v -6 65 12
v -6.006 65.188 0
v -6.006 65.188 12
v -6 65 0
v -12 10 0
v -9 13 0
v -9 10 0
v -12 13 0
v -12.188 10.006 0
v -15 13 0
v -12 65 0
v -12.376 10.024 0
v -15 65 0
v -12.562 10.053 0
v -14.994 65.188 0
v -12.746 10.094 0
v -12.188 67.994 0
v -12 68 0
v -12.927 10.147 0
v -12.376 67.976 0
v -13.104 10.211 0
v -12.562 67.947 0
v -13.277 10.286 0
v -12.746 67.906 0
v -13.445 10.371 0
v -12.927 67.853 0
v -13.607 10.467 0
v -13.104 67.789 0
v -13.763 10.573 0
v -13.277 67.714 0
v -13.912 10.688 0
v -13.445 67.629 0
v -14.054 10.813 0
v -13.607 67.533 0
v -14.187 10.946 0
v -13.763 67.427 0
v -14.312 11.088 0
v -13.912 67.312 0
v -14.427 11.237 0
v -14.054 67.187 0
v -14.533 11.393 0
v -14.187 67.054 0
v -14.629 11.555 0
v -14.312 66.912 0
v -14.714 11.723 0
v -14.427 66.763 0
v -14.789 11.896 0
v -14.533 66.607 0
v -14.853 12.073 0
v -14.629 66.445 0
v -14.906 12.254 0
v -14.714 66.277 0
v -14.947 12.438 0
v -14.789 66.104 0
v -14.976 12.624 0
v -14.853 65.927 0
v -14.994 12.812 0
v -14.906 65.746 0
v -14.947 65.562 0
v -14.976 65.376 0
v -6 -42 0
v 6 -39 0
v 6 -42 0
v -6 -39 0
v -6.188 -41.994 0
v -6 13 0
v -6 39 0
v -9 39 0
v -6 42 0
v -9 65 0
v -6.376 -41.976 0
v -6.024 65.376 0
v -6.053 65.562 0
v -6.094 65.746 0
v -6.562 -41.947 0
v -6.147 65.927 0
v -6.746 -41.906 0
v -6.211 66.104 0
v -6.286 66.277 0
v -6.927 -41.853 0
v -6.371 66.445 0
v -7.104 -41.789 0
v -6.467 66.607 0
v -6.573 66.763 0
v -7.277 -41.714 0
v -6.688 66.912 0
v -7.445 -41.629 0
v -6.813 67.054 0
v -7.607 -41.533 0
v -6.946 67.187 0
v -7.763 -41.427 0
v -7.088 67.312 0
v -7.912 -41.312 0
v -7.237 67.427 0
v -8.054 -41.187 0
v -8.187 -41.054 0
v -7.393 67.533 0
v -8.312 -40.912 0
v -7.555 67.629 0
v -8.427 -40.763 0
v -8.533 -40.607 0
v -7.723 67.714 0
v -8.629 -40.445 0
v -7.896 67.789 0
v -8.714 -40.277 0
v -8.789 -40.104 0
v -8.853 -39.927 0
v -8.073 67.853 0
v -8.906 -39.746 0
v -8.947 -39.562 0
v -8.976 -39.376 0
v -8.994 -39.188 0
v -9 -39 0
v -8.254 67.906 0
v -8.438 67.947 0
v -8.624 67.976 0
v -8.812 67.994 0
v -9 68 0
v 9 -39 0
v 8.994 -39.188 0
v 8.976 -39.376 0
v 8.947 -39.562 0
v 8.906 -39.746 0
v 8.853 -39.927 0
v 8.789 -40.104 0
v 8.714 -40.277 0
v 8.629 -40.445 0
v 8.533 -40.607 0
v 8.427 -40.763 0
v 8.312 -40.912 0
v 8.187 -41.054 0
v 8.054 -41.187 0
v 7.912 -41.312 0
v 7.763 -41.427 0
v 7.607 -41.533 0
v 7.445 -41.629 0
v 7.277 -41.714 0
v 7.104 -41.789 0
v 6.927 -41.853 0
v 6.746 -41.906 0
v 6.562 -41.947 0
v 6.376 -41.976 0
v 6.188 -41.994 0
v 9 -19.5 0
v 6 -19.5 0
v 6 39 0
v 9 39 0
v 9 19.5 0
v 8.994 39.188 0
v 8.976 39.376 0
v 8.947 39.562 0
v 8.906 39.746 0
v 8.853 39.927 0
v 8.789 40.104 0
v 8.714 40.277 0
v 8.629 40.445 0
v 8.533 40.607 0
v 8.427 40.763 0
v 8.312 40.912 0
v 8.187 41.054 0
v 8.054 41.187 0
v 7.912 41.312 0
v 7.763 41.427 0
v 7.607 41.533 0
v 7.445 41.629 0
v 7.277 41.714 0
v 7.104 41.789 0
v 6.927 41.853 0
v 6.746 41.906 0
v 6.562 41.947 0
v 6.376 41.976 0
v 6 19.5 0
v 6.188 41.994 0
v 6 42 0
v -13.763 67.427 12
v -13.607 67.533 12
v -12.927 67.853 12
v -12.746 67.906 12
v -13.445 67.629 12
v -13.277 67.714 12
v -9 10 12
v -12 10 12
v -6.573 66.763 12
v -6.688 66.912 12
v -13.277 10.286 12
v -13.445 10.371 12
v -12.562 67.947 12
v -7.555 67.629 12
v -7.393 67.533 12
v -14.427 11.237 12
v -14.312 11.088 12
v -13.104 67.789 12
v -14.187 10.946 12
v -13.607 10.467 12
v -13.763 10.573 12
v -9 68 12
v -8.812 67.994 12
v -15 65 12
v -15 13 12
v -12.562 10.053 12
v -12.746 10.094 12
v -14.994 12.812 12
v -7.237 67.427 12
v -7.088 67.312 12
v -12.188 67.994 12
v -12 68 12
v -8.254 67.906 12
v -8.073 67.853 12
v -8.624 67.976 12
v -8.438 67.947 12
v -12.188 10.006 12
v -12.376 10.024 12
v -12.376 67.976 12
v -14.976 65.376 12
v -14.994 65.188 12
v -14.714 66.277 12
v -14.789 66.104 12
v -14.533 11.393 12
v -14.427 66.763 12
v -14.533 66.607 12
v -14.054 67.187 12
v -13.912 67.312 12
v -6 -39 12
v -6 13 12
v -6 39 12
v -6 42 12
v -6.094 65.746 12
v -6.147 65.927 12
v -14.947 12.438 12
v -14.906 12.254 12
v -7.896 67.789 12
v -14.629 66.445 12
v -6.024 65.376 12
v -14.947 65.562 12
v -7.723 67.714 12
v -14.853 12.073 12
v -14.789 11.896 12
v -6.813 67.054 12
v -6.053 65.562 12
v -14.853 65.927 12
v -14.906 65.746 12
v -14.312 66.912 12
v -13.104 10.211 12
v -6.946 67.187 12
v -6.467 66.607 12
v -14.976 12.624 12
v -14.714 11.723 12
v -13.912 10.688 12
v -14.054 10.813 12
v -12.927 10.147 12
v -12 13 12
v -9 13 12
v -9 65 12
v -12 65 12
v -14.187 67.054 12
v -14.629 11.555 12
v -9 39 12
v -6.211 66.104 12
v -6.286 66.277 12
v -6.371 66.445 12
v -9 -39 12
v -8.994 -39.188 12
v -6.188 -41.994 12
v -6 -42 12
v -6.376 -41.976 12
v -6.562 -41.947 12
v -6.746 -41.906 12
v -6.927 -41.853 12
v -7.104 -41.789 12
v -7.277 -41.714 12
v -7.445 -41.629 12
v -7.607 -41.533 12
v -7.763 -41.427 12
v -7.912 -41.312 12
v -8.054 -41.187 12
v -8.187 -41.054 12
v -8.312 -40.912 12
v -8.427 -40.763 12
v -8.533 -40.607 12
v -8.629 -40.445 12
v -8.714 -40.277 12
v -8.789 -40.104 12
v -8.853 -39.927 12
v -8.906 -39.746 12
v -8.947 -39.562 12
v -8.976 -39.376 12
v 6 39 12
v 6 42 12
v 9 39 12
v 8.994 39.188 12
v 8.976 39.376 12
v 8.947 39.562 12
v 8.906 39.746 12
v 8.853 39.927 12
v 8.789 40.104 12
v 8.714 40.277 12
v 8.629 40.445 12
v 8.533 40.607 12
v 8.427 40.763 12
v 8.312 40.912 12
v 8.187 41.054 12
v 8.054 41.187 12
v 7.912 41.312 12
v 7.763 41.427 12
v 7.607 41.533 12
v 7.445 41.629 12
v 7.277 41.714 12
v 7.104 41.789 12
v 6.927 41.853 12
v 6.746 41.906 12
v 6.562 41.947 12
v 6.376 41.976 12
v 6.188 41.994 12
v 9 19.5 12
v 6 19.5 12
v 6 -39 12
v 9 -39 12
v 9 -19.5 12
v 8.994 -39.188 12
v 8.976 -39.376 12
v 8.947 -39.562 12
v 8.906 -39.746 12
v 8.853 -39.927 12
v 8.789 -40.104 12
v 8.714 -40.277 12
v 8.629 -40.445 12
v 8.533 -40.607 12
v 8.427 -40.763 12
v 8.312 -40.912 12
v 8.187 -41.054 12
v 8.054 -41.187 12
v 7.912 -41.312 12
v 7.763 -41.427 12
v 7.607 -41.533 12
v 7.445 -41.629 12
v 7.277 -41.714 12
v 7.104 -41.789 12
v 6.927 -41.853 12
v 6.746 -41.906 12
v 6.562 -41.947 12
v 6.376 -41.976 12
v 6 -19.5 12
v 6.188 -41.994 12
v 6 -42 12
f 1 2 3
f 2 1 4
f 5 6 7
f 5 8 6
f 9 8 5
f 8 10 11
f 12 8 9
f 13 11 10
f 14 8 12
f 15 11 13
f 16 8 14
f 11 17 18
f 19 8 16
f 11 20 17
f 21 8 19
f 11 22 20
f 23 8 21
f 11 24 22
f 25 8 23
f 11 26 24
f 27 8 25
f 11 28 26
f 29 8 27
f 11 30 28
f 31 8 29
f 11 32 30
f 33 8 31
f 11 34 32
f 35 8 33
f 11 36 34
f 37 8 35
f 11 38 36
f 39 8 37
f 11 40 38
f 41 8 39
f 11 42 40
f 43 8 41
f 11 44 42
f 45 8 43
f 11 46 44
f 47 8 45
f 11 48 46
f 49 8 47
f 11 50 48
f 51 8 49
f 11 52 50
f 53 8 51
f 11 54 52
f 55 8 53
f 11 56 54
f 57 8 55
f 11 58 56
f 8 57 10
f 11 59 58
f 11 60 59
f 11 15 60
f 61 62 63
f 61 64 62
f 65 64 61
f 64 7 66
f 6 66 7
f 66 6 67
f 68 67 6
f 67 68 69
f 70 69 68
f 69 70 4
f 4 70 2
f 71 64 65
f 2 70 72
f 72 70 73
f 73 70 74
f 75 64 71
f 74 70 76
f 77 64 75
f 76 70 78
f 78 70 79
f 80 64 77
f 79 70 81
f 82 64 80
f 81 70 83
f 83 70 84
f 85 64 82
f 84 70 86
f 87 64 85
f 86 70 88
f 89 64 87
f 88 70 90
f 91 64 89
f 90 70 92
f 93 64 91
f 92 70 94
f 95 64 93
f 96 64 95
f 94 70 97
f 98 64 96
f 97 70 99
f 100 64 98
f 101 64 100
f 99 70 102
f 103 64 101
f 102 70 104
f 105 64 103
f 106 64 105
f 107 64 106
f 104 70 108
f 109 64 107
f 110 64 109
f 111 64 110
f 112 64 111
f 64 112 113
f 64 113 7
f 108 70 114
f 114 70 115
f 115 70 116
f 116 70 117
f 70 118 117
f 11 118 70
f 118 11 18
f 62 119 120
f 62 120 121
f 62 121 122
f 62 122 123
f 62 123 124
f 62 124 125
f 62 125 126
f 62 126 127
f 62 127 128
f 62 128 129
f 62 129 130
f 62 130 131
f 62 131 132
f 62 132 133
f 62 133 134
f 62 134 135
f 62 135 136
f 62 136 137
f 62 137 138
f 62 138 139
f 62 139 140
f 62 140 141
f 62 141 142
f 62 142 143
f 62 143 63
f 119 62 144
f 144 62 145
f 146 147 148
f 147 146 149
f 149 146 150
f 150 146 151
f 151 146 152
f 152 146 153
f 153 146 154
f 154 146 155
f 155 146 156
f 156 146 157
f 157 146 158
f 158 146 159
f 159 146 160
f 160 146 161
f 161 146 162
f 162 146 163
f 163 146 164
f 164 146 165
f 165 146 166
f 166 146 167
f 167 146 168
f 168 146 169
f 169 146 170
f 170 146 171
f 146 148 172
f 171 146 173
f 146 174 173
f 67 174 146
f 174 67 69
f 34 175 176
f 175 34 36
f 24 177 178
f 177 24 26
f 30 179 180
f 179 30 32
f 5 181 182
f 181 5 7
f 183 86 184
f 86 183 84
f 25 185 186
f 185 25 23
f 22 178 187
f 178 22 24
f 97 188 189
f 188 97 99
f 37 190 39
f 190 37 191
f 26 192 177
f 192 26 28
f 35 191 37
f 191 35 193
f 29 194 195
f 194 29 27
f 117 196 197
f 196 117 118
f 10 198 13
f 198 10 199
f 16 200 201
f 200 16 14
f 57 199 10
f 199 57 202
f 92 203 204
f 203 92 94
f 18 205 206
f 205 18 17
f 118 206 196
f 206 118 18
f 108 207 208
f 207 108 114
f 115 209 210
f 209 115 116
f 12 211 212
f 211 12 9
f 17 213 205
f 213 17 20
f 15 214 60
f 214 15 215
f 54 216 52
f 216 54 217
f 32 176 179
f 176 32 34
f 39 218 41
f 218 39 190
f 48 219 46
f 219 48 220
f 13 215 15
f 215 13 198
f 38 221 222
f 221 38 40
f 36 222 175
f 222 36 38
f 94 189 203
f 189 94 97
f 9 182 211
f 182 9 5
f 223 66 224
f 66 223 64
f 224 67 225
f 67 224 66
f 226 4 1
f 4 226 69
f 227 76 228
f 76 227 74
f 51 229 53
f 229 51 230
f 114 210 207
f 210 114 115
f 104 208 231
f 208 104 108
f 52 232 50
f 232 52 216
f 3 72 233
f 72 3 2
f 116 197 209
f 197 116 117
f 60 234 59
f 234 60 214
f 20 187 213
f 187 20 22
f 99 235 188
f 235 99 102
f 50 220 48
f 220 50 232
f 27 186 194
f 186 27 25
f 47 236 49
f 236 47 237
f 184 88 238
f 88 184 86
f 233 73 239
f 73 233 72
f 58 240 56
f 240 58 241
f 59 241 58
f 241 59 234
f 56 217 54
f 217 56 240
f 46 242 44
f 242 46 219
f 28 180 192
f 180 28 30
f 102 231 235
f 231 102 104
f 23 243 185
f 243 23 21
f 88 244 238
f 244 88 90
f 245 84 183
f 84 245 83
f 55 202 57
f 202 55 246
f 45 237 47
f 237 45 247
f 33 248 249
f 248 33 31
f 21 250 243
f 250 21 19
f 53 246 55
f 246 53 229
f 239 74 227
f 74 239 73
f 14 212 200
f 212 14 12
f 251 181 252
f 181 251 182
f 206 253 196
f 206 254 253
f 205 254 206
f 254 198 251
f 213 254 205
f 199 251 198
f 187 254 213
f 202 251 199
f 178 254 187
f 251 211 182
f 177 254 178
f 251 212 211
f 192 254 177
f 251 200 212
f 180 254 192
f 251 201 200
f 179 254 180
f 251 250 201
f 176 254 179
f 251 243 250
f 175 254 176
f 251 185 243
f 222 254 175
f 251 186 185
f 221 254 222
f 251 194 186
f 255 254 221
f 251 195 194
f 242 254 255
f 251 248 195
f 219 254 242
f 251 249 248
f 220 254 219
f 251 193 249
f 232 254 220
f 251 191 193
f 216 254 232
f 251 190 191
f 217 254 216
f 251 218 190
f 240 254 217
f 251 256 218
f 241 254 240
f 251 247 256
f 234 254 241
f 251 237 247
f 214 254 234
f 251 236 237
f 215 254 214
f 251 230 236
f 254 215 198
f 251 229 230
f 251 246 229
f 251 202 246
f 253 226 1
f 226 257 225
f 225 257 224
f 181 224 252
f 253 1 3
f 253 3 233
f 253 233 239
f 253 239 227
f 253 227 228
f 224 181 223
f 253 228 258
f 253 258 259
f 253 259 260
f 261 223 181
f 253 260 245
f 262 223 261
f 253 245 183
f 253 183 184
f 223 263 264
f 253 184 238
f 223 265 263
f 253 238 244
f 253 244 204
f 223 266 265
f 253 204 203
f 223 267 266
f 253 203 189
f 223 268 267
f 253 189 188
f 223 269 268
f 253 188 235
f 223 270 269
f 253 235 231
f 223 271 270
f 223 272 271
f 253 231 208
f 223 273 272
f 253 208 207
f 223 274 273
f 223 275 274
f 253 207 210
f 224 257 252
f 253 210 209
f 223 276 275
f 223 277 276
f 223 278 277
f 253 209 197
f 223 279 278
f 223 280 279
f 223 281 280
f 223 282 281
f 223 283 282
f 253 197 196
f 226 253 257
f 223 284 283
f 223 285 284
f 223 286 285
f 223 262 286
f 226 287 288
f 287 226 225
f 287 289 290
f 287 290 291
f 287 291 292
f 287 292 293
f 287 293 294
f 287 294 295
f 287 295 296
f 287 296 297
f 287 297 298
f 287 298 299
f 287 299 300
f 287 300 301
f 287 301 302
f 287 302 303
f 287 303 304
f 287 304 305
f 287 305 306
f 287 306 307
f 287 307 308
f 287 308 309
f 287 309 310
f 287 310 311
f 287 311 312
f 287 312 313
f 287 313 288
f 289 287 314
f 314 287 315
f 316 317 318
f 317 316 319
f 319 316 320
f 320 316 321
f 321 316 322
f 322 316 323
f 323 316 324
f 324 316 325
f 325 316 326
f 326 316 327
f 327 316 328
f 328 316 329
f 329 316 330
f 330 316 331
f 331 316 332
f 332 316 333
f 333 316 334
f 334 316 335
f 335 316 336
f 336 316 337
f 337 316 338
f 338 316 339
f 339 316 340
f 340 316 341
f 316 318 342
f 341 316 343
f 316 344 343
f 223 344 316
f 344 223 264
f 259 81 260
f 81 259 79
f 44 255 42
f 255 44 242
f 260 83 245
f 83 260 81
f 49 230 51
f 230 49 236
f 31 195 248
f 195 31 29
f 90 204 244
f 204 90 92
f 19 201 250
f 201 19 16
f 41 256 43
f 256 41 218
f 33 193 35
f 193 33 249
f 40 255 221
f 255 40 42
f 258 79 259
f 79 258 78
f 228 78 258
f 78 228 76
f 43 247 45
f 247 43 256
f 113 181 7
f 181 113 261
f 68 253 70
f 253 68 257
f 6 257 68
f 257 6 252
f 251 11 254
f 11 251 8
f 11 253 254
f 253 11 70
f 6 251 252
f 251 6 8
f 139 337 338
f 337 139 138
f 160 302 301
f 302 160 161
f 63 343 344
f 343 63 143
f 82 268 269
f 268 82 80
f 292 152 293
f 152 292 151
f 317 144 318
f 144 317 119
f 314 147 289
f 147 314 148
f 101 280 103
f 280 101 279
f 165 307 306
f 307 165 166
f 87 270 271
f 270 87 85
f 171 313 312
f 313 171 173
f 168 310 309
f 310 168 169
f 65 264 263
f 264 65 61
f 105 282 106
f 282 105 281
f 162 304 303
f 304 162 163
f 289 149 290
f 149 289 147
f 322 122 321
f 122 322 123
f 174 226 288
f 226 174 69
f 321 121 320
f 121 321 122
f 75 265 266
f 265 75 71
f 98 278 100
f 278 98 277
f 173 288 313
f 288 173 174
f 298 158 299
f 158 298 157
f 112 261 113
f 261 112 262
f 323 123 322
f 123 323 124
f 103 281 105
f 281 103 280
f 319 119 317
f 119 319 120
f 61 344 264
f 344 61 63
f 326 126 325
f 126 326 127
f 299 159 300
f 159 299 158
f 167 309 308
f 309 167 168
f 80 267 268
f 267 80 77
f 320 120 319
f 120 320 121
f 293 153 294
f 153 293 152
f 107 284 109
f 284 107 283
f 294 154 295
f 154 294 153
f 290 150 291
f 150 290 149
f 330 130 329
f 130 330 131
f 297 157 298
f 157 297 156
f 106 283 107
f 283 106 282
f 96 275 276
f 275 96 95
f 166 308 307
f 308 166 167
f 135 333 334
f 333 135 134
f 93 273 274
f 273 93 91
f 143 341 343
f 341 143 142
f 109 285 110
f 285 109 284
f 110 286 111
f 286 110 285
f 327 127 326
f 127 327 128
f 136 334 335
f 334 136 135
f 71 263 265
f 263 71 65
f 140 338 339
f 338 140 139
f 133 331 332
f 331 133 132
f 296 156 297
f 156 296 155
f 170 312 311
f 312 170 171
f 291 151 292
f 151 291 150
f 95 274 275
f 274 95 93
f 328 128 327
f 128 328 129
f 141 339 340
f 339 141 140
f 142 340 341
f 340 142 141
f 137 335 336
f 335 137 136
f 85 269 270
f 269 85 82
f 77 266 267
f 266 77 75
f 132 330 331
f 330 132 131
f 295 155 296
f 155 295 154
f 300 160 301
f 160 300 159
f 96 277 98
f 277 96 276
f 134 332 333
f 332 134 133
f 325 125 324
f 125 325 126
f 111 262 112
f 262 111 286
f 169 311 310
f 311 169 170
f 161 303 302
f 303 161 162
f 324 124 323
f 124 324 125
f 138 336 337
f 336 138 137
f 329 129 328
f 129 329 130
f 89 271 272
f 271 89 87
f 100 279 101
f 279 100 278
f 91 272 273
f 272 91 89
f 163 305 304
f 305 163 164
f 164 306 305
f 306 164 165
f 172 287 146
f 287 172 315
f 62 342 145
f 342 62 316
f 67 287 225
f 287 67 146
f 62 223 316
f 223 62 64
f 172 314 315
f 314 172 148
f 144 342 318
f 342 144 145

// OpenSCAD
$fn=100;



//CUSTOMIZER VARIABLES
/* [Easy Photo Rig] */
 
//the thickness of your phone
phone_depth = 12; 

//the width of your phone
phone_width = 78; 

//the width of your ruler 
ruler_width = 52; 

//the thickness of your ruler
ruler_thickness = 3;  


//the width of the bracket
bracket_width = 12;  

//the thickness of the walls and radius of the corners
corner_radius =3; 
  
  
//use this to angle the phone down slightly. values above 10 are not recommended
tilt_angle = 0;

//CUSTOMIZER VARIABLES END




module ruler_holder()
{
    //offset the ruler holder from the phone holder
    rotate([0,0,tilt_angle])
    translate([-(phone_depth/2+corner_radius)-(ruler_thickness/2),phone_width/2,0])
difference()
{
hull()
{
    translate([-ruler_thickness/2,ruler_width/2,0])
        cylinder(h=bracket_width,r1=corner_radius,r2=corner_radius);
     translate([ruler_thickness/2,ruler_width/2,0])
        cylinder(h=bracket_width,r1=corner_radius,r2=corner_radius);  
   
   
       translate([-ruler_thickness/2,-ruler_width/2,0])
        cylinder(h=bracket_width,r1=corner_radius,r2=corner_radius);
     translate([ruler_thickness/2,-ruler_width/2,0])
        cylinder(h=bracket_width,r1=corner_radius,r2=corner_radius) ;
   
    
};

    cube([ruler_thickness/2*2,ruler_width/2*2,bracket_width*2+2],true);

}
}



module phone_holder()
{
difference()
{
hull()
{
    translate([-phone_depth/2,phone_width/2,0])
        cylinder(h=bracket_width,r1=corner_radius,r2=corner_radius);
     translate([phone_depth/2,phone_width/2,0])
        cylinder(h=bracket_width,r1=corner_radius,r2=corner_radius);  
   
   
       translate([-phone_depth/2,-phone_width/2,0])
        cylinder(h=bracket_width,r1=corner_radius,r2=corner_radius);
     translate([phone_depth/2,-phone_width/2,0])
        cylinder(h=bracket_width,r1=corner_radius,r2=corner_radius) ;
   
    
};

    cube([phone_depth/2*2,phone_width/2*2,bracket_width*2+2],true);

translate([bracket_width-2,0,0])
    cube([phone_depth/2*2,phone_width/2,bracket_width*2+2],true);
}
}



ruler_holder();
phone_holder();
